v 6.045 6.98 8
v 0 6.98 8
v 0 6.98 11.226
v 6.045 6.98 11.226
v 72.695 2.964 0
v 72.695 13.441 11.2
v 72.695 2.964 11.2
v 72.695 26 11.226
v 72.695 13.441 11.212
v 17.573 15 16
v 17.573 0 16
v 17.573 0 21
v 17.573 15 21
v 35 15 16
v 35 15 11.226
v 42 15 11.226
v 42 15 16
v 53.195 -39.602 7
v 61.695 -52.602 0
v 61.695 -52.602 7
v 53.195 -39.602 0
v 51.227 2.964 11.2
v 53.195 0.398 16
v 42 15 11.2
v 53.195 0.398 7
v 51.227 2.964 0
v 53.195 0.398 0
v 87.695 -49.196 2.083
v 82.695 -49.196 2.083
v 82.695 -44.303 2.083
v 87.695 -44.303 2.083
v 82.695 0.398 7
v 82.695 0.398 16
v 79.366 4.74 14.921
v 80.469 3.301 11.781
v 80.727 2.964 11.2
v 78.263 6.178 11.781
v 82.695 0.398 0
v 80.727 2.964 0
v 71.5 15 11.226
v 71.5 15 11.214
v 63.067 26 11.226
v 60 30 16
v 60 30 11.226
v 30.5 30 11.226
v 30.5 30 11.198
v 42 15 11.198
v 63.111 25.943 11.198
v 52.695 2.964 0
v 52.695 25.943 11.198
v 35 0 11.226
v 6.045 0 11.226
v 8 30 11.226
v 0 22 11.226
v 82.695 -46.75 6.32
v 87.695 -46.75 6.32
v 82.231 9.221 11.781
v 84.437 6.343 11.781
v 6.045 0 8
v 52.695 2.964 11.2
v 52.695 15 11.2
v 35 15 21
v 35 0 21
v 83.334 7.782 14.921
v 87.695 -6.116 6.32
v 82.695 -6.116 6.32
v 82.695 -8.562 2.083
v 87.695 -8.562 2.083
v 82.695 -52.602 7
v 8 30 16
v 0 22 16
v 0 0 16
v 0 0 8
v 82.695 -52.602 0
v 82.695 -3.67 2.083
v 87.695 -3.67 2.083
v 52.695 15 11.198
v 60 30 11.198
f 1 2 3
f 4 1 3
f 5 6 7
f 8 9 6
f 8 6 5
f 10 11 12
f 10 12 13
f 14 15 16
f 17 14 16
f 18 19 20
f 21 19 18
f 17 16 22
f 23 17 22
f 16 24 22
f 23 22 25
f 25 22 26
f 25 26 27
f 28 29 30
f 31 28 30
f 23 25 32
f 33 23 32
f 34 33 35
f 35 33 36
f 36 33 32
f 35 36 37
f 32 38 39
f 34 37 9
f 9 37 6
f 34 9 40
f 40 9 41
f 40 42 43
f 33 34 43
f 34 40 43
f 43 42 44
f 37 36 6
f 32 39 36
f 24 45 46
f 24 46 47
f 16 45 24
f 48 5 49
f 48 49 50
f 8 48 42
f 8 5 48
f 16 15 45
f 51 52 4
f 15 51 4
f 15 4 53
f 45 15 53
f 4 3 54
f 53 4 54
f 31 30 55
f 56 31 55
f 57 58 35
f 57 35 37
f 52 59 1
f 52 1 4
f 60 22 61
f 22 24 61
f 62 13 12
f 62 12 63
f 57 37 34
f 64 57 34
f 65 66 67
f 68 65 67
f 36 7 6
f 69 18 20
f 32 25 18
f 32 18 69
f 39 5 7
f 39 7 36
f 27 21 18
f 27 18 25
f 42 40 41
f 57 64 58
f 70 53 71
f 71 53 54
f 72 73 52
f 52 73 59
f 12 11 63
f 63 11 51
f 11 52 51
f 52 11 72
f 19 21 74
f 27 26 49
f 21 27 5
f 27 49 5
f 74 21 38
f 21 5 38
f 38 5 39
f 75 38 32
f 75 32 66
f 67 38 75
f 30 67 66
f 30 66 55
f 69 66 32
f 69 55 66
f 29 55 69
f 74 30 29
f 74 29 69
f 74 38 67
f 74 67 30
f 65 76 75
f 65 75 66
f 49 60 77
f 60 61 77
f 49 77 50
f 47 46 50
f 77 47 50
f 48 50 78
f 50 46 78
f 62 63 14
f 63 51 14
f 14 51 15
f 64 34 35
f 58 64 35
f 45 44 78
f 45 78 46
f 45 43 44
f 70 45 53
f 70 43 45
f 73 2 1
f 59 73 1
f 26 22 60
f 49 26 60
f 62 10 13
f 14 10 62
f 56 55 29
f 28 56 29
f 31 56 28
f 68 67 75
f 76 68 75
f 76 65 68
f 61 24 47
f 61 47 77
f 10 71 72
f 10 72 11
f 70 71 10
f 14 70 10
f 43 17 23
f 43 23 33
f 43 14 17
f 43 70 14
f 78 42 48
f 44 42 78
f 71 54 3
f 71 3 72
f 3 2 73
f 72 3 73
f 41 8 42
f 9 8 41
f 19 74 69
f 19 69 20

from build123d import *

# Parameters (mm, degrees)
Y_KSEKLIK_EKSTR_ZYON1_DEPTH  = 7
Y_KSEKLIK_EKSTR_ZYON3_DEPTH  = 16
IZIM4_W                      = 28.954743141
IZIM4_H                      = 11.22646766
KES_EKSTR_ZYON1_DEPTH        = 46
IZIM5_W                      = 11.030629952
IZIM5_H                      = 8.549284238
KES_EKSTR_ZYON2_DEPTH        = 46
IZIM6_W                      = 6.045256859
IZIM6_H                      = 10.292433703
KES_EKSTR_ZYON3_DEPTH        = 46
IZIM7_W                      = 3.22646766
IZIM7_H                      = 15.019672312
KES_EKSTR_ZYON5_DEPTH        = 10
IZIM9_W                      = 11.22646766
IZIM9_H                      = 15
KES_EKSTR_ZYON6_DEPTH        = 50
KES_EKSTR_ZYON9_DEPTH        = 11.2
Y_KSEKLIK_EKSTR_ZYON4_DEPTH  = 5
Y_KSEKLIK_EKSTR_ZYON7_DEPTH  = 5
IZIM17_W                     = 17.426851058
IZIM17_H                     = 15
Y_KSEKLIK_EKSTR_ZYON8_DEPTH  = 5
Y_KSEKLIK_EKSTR_ZYON18_DEPTH = 0.028
Y_KSEKLIK_EKSTR_ZYON20_START = -10
Y_KSEKLIK_EKSTR_ZYON20_DEPTH = 20


with BuildPart() as part:
    # Çizim1 → Yükseklik-Ekstrüzyon1 (new body)
    with BuildSketch(Plane.XY):
        Polygon((42, 15), (53.195140403, 0.397642952), (82.695140403, 0.397642952), (60, 30), (8, 30), (0, 22), (0, 0), (35, 0), (35, 15), align=None)
        Polygon((61.695140403, -52.602357048), (53.195140403, -39.602357048), (53.195140403, 0.397642952), (82.695140403, 0.397642952), (82.695140403, -52.602357048), align=None)
    extrude(amount=Y_KSEKLIK_EKSTR_ZYON1_DEPTH)

    # Çizim2 → Yükseklik-Ekstrüzyon3 (add)
    with BuildSketch(Plane(origin=(0, 0, 0), x_dir=(-1, 0, 0), z_dir=(0, 0, -1))):
        Polygon((-53.195140403, 0.397642952), (-82.695140403, 0.397642952), (-60, 30), (-8, 30), (0, 22), (0, 0), (-35, 0), (-35, 15), (-42, 15), align=None)
    extrude(amount=-Y_KSEKLIK_EKSTR_ZYON3_DEPTH)

    # Çizim4 → Kes-Ekstrüzyon1 (cut)
    with BuildSketch(Plane.XZ):
        with Locations((20.522628429, 5.61323383)):
            Rectangle(IZIM4_W, IZIM4_H)
    extrude(amount=-KES_EKSTR_ZYON1_DEPTH, mode=Mode.SUBTRACT)

    # Çizim5 → Kes-Ekstrüzyon2 (cut)
    with BuildSketch(Plane(origin=(-11, 11, 0), x_dir=(0, 0, 1), z_dir=(-0.7071067811865477, 0.7071067811865475, 0))):
        with Locations((5.711152684, 19.830991305)):
            Rectangle(IZIM5_W, IZIM5_H)
    extrude(amount=-KES_EKSTR_ZYON2_DEPTH, mode=Mode.SUBTRACT)

    # Çizim6 → Kes-Ekstrüzyon3 (cut)
    with BuildSketch(Plane.XZ):
        with Locations((3.02262843, 2.853783148)):
            Rectangle(IZIM6_W, IZIM6_H)
    extrude(amount=-KES_EKSTR_ZYON3_DEPTH, mode=Mode.SUBTRACT)

    # Çizim7 → Kes-Ekstrüzyon5 (cut)
    with BuildSketch(Plane.ZY):
        with Locations((9.61323383, 14.490163844)):
            Rectangle(IZIM7_W, IZIM7_H)
    extrude(amount=-KES_EKSTR_ZYON5_DEPTH, mode=Mode.SUBTRACT)

    # Çizim9 → Kes-Ekstrüzyon6 (cut)
    with BuildSketch(Plane.ZY.offset(-35)):
        with Locations((5.61323383, 22.5)):
            Rectangle(IZIM9_W, IZIM9_H)
    extrude(amount=-KES_EKSTR_ZYON6_DEPTH, mode=Mode.SUBTRACT)

    # Çizim11 → Kes-Ekstrüzyon9 (cut)
    with BuildSketch(Plane(origin=(0, 0, 0), x_dir=(-1, 0, 0), z_dir=(0, 0, -1))):
        Polygon((-80.727385525, 2.96427975), (-71.5, 15), (-42, 15), (-51.227385525, 2.96427975), align=None)
    extrude(amount=-KES_EKSTR_ZYON9_DEPTH, mode=Mode.SUBTRACT)

    # Çizim14 → Yükseklik-Ekstrüzyon4 (add)
    with BuildSketch(Plane(origin=(82.695140403, 0, 0), x_dir=(0, 0, -1), z_dir=(1, 0, 0))):
        Polygon((-2.082581095, -49.195758149), (-2.082581095, -44.303374806), (-6.319509355, -46.749566478), align=None)
        Polygon((-2.082581095, -3.669592505), (-6.319509355, -6.115784177), (-2.082581095, -8.561975848), align=None)
    extrude(amount=Y_KSEKLIK_EKSTR_ZYON4_DEPTH)

    # Çizim15 → Yükseklik-Ekstrüzyon7 (add)
    with BuildSketch(Plane(origin=(52.274317705, 40.076976907, 0), x_dir=(0, 0, -1), z_dir=(0.7936063612919158, 0.6084315436571359, 0))):
        Polygon((-14.921026004, -44.527343425), (-11.781107025, -46.340176493), (-11.781107025, -42.714510357), align=None)
    extrude(amount=Y_KSEKLIK_EKSTR_ZYON7_DEPTH)

    # Çizim17 → Yükseklik-Ekstrüzyon8 (add)
    with BuildSketch(Plane.XY.offset(16)):
        with Locations((26.286574471, 7.5)):
            Rectangle(IZIM17_W, IZIM17_H)
    extrude(amount=Y_KSEKLIK_EKSTR_ZYON8_DEPTH)

    # Çizim21 → Yükseklik-Ekstrüzyon18 (add)
    with BuildSketch(Plane(origin=(0, 0, 11.22646766), x_dir=(-1, 0, 0), z_dir=(0, 0, -1))):
        Polygon((-42, 15), (-71.5, 15), (-60, 30), (-30.5, 30), align=None)
    extrude(amount=Y_KSEKLIK_EKSTR_ZYON18_DEPTH)

    # Çizim18 → Yükseklik-Ekstrüzyon20 (add)
    with BuildSketch(Plane(origin=(82.695140403, 0, 0), x_dir=(0, 0, -1), z_dir=(1, 0, 0)).offset(Y_KSEKLIK_EKSTR_ZYON20_START)):
        Polygon((0, 2.96427975), (-11.22646766, 26), (-11.2, 2.96427975), align=None)
    extrude(amount=-Y_KSEKLIK_EKSTR_ZYON20_DEPTH)


solid = part.part
